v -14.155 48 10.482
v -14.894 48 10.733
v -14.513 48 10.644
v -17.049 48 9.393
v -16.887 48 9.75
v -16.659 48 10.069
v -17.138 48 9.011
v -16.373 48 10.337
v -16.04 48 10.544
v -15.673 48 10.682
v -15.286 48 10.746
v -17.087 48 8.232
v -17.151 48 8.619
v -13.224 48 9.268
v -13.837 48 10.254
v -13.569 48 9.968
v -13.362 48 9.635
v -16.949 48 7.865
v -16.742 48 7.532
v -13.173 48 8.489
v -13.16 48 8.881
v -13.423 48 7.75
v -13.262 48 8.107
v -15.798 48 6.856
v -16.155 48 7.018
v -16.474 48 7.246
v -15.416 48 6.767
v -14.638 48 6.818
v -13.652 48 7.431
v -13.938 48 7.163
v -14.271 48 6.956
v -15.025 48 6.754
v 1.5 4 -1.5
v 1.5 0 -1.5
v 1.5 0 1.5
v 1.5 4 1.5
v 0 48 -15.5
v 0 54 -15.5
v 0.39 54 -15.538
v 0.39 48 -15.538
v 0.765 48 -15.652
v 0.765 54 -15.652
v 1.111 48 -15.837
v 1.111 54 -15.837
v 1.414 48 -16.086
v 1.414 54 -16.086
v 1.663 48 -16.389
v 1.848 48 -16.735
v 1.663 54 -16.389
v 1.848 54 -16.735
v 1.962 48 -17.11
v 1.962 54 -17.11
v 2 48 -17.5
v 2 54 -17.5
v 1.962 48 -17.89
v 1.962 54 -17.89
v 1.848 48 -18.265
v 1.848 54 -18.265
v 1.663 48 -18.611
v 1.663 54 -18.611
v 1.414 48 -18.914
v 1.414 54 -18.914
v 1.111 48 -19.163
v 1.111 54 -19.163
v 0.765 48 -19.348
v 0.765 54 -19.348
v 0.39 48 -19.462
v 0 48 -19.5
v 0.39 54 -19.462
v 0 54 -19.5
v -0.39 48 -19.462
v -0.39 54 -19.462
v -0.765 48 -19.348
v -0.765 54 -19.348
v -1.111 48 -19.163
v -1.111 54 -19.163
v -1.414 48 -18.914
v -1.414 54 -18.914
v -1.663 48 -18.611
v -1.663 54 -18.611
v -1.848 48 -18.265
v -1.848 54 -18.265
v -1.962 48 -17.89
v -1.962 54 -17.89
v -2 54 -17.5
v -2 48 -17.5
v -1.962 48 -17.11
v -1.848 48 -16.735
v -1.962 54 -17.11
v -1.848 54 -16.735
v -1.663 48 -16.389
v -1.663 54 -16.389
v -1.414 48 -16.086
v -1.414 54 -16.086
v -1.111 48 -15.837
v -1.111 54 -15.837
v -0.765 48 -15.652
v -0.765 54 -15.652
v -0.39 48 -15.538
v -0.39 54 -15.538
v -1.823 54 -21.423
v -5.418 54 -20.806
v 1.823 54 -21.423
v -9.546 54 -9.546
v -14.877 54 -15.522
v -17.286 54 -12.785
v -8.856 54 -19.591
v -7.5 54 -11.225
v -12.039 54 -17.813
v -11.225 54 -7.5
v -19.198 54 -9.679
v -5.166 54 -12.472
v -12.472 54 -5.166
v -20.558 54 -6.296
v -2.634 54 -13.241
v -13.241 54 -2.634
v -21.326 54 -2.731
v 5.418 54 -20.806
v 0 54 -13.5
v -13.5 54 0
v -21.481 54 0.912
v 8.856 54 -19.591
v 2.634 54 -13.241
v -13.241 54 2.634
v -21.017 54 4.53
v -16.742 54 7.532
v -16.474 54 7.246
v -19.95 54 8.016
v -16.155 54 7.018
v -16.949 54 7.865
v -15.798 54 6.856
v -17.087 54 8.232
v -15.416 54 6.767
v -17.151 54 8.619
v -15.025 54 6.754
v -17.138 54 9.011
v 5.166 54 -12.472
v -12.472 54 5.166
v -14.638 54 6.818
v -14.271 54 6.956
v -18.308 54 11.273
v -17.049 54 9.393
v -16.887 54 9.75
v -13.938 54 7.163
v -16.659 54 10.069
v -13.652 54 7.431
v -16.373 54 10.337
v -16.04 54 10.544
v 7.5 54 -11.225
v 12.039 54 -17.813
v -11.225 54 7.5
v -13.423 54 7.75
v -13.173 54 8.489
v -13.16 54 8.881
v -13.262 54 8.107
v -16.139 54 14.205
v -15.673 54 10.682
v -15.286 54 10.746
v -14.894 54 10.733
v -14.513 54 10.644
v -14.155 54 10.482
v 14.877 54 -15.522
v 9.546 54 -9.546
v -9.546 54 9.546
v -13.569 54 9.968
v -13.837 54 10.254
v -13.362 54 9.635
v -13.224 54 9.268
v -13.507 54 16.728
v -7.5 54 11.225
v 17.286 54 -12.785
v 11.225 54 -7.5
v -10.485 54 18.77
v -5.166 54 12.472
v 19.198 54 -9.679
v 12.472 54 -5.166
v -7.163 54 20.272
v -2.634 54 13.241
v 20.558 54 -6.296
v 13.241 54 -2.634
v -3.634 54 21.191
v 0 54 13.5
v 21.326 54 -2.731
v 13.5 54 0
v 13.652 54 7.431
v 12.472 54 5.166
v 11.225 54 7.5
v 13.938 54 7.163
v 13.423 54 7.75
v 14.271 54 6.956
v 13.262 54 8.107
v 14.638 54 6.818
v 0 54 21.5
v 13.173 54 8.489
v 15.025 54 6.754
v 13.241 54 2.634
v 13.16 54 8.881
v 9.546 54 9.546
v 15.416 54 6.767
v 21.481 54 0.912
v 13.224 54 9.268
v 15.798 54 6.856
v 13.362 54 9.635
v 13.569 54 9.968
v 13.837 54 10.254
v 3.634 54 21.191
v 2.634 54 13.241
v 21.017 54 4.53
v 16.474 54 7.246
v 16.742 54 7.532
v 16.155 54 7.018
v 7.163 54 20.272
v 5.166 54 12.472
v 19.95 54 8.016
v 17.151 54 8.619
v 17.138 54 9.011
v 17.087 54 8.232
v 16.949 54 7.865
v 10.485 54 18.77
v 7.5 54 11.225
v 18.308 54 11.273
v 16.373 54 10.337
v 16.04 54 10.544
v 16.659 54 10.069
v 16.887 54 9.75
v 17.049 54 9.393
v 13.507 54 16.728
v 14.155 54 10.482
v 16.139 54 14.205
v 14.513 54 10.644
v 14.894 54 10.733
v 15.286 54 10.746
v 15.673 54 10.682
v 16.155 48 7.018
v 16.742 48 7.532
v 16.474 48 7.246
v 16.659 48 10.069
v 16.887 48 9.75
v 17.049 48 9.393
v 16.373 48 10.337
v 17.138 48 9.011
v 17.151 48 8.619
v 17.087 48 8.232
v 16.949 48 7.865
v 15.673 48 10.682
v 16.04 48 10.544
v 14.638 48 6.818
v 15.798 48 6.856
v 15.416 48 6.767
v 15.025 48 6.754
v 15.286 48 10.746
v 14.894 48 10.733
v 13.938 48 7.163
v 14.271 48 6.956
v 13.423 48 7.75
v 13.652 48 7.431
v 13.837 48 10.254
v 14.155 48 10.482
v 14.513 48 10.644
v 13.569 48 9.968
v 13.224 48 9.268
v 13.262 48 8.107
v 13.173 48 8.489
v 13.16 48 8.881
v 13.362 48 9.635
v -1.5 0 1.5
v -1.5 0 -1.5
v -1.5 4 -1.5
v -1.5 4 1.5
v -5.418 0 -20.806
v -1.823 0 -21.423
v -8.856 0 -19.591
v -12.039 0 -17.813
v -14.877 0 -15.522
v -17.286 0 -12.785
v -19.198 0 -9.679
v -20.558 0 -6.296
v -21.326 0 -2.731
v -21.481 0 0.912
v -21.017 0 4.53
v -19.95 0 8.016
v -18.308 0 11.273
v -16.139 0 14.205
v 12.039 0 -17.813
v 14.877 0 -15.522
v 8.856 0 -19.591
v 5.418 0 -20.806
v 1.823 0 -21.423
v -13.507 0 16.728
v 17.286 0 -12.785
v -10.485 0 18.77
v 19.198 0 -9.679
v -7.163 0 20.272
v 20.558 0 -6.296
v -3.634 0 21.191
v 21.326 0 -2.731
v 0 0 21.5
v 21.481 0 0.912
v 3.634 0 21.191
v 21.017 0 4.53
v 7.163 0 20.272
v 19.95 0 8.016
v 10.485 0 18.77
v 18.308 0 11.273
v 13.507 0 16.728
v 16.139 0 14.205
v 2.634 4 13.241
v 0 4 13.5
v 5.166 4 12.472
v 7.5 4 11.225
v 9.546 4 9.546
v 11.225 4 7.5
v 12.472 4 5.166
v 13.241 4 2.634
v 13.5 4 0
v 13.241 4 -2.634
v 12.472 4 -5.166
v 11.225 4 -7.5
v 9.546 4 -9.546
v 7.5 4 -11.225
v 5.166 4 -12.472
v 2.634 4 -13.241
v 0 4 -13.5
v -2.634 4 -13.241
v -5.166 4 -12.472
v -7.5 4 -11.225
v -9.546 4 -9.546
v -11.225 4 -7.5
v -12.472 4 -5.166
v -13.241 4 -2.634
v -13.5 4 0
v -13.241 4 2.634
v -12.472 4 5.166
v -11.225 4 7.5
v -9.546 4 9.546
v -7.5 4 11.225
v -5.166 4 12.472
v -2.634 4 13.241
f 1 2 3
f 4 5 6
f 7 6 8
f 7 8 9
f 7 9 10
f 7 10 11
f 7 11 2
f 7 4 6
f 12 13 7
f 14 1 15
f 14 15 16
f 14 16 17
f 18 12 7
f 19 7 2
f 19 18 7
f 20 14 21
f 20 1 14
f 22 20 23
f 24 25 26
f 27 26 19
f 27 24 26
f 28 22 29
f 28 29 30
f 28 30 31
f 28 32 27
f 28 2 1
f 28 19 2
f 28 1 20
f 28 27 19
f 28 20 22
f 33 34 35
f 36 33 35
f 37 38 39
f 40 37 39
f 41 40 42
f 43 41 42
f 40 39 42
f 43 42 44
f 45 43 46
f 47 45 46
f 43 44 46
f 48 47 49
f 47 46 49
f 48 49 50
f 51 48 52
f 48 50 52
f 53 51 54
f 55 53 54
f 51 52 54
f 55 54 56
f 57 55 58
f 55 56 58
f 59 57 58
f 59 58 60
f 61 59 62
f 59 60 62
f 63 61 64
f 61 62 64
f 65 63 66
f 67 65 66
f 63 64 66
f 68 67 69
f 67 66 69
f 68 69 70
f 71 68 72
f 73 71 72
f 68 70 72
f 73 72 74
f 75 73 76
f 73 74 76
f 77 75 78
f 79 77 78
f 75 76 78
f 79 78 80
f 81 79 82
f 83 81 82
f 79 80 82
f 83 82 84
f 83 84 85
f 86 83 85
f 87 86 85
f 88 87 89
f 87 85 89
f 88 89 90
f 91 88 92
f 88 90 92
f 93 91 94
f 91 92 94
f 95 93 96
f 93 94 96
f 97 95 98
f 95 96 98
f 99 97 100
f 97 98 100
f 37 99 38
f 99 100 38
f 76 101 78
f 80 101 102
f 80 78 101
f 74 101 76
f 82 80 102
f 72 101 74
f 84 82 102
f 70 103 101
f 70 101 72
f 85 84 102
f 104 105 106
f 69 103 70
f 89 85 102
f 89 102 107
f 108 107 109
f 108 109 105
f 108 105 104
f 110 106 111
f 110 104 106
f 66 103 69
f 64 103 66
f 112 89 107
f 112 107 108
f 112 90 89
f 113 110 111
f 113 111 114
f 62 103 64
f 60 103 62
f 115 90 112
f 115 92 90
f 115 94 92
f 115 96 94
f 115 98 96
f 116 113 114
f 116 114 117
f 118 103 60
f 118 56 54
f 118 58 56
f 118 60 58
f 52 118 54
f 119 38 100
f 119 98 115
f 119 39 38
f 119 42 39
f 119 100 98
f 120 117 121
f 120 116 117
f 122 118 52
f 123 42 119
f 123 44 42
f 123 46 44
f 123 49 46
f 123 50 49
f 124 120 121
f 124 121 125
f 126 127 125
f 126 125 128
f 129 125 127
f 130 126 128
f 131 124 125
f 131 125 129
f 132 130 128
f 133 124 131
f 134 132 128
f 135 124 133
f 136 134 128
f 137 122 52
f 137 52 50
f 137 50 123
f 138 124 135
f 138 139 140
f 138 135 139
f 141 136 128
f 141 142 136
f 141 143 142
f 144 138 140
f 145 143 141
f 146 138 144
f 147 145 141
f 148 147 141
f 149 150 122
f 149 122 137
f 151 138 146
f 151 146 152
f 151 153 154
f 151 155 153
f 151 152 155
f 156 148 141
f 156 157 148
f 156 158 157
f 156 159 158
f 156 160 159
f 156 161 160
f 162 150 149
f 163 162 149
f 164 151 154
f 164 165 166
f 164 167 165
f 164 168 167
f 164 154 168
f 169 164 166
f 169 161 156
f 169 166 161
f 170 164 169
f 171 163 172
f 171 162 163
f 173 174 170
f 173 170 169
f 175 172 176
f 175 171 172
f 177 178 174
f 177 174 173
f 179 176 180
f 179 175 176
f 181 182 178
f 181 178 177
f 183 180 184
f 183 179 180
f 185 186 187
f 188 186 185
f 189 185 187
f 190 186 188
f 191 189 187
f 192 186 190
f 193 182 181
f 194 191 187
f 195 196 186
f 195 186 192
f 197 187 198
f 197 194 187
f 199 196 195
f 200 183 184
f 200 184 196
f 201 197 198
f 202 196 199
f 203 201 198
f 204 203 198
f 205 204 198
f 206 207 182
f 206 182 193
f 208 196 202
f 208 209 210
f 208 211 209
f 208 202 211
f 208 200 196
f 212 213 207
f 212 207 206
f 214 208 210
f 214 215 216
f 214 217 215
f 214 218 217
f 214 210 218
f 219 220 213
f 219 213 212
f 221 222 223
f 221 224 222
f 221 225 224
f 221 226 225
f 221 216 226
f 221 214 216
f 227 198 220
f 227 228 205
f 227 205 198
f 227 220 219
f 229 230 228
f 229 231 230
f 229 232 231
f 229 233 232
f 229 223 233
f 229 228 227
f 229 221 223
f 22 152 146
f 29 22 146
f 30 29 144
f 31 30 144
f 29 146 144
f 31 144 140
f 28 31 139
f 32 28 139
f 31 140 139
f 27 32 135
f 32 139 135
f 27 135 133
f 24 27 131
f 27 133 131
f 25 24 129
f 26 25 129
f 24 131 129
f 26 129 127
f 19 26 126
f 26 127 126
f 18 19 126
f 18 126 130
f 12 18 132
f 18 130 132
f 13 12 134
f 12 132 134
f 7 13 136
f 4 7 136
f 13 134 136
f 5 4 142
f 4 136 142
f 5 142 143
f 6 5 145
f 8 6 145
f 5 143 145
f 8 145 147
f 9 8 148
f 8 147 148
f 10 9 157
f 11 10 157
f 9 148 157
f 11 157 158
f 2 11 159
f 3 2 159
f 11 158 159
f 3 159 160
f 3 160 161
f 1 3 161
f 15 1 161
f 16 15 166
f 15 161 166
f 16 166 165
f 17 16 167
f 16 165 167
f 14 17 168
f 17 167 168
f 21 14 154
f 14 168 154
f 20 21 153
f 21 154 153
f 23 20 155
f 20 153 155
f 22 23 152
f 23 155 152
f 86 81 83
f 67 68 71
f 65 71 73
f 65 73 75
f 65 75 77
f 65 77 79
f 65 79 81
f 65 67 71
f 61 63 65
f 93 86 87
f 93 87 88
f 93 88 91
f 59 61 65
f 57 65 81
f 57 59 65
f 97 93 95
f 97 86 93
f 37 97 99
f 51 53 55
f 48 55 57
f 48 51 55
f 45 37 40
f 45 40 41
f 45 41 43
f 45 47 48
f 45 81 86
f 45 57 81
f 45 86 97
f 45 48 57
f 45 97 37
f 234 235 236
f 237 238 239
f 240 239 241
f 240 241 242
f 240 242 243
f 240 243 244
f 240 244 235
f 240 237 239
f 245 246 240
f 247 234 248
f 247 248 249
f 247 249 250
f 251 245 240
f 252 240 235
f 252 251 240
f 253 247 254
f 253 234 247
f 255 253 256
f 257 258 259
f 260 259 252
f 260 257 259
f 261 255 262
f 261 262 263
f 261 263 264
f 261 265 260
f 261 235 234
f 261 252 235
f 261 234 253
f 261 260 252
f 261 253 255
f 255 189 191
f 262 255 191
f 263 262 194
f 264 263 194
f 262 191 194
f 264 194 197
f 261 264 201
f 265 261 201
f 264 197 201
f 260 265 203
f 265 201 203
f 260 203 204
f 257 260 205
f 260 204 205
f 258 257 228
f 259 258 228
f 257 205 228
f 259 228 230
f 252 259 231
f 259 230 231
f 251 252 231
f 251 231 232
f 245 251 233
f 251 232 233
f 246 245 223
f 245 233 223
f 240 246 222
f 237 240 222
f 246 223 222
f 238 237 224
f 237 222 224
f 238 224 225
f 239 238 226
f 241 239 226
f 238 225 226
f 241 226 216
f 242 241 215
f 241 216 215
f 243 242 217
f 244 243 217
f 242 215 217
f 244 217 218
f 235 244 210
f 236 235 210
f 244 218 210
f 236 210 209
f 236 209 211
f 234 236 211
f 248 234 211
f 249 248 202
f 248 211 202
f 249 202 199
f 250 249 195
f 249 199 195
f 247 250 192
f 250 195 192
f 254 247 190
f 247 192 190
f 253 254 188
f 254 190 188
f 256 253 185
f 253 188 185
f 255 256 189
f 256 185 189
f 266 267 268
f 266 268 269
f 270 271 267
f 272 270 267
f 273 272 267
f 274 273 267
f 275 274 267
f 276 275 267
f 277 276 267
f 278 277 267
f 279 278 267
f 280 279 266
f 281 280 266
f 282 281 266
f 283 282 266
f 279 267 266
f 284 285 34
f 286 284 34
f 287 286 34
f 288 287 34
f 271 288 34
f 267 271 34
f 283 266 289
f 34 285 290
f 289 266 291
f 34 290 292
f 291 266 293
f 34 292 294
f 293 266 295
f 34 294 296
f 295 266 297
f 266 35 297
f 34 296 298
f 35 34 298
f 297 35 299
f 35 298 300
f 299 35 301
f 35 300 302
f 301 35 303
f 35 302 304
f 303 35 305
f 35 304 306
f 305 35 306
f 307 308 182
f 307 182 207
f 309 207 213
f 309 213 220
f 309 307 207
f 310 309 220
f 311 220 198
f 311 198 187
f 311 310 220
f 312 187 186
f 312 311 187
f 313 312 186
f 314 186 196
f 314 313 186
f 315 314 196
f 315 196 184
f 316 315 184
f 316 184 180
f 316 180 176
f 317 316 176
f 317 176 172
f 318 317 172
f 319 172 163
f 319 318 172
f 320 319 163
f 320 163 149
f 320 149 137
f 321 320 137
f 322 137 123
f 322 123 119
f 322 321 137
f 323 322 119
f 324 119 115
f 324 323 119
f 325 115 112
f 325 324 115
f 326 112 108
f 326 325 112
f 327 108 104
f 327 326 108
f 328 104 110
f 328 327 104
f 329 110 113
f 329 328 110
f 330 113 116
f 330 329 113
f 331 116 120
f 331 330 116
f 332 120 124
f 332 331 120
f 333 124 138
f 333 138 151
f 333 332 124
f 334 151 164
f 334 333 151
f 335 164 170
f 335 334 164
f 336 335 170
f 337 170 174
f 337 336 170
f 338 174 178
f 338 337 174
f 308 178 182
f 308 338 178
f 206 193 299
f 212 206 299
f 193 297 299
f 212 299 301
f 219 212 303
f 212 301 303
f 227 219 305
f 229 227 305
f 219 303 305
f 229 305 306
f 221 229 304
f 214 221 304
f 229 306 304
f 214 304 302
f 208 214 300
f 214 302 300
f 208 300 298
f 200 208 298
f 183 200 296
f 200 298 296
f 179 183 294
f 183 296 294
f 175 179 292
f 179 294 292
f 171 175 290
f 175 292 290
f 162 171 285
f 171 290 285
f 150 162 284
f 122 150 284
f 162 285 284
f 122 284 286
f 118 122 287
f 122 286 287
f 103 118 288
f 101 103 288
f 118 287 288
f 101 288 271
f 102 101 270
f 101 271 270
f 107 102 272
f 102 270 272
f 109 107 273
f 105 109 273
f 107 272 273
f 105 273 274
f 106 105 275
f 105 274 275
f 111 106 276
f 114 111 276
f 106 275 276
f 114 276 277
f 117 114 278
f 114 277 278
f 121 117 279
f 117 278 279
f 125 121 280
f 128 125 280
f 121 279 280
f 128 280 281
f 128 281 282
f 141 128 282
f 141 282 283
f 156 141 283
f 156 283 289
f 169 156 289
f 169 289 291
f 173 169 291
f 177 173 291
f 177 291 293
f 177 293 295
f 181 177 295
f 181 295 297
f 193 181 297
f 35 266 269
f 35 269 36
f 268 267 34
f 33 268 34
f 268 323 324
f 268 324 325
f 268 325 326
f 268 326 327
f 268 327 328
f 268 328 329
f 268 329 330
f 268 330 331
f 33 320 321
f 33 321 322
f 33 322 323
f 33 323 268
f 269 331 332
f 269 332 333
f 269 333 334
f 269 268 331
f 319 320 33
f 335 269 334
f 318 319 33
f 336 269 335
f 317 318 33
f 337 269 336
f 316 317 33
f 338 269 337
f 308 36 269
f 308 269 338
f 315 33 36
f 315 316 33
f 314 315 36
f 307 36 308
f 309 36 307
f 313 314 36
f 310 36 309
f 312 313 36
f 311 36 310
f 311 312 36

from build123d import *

# Parameters (mm, degrees)
SKETCH1_R           = 21.5
BOSS_EXTRUDE1_DEPTH = 4
SKETCH2_R           = 21.5
SKETCH2_R_2         = 13.5
BOSS_EXTRUDE2_DEPTH = 50
SKETCH3_R           = 2
CUT_EXTRUDE1_DEPTH  = 6
CIRPATTERN1_COUNT   = 3
CUT_EXTRUDE2_REACH  = 63.972
SKETCH4_W           = 3
SKETCH4_H           = 3


with BuildPart() as part:
    # Sketch1 → Boss-Extrude1 (new body)
    with BuildSketch(Plane(origin=(0, 0, 0), x_dir=(1, 0, 0), z_dir=(0, 1, 0))):
        with Locations(Location((0, 0, 0), (0, 0, 270))):
            Circle(SKETCH1_R)
    extrude(amount=BOSS_EXTRUDE1_DEPTH)

    # Sketch2 → Boss-Extrude2 (add)
    with BuildSketch(Plane(origin=(0, 4, 0), x_dir=(1, 0, 0), z_dir=(0, 1, 0))):
        with Locations(Location((0, 0, 0), (0, 0, 270))):
            Circle(SKETCH2_R)
        with Locations(Location((0, 0, 0), (0, 0, 270))):
            Circle(SKETCH2_R_2, mode=Mode.SUBTRACT)
    extrude(amount=BOSS_EXTRUDE2_DEPTH)

    # Sketch3 → Cut-Extrude1 (cut)
    with BuildSketch(Plane(origin=(0, 54, 0), x_dir=(1, 0, 0), z_dir=(0, 1, 0))):
        with Locations(Location((0, 17.5, 0), (0, 0, 270))):
            Circle(SKETCH3_R)
    cut_extrude1 = extrude(amount=-CUT_EXTRUDE1_DEPTH, mode=Mode.SUBTRACT)

    # CirPattern1: Cut-Extrude1 ×3 about axis
    cirpattern1_axis = Axis((0, 0, 0), (0, 1, 0))
    for i in range(1, CIRPATTERN1_COUNT):
        add(cut_extrude1.rotate(cirpattern1_axis, i * 360 / CIRPATTERN1_COUNT), mode=Mode.SUBTRACT)

    # Sketch4 → Cut-Extrude2 (cut, up to next)
    with BuildSketch(Plane.XZ, mode=Mode.PRIVATE) as cut_extrude2_sk1:
        Rectangle(SKETCH4_W, SKETCH4_H)
    cut_extrude2_tool1 = extrude(cut_extrude2_sk1.sketch, amount=-CUT_EXTRUDE2_REACH, mode=Mode.PRIVATE) & part.part
    add(cut_extrude2_tool1.solids().sort_by_distance((0, 0, 0))[0], mode=Mode.SUBTRACT)


solid = part.part
